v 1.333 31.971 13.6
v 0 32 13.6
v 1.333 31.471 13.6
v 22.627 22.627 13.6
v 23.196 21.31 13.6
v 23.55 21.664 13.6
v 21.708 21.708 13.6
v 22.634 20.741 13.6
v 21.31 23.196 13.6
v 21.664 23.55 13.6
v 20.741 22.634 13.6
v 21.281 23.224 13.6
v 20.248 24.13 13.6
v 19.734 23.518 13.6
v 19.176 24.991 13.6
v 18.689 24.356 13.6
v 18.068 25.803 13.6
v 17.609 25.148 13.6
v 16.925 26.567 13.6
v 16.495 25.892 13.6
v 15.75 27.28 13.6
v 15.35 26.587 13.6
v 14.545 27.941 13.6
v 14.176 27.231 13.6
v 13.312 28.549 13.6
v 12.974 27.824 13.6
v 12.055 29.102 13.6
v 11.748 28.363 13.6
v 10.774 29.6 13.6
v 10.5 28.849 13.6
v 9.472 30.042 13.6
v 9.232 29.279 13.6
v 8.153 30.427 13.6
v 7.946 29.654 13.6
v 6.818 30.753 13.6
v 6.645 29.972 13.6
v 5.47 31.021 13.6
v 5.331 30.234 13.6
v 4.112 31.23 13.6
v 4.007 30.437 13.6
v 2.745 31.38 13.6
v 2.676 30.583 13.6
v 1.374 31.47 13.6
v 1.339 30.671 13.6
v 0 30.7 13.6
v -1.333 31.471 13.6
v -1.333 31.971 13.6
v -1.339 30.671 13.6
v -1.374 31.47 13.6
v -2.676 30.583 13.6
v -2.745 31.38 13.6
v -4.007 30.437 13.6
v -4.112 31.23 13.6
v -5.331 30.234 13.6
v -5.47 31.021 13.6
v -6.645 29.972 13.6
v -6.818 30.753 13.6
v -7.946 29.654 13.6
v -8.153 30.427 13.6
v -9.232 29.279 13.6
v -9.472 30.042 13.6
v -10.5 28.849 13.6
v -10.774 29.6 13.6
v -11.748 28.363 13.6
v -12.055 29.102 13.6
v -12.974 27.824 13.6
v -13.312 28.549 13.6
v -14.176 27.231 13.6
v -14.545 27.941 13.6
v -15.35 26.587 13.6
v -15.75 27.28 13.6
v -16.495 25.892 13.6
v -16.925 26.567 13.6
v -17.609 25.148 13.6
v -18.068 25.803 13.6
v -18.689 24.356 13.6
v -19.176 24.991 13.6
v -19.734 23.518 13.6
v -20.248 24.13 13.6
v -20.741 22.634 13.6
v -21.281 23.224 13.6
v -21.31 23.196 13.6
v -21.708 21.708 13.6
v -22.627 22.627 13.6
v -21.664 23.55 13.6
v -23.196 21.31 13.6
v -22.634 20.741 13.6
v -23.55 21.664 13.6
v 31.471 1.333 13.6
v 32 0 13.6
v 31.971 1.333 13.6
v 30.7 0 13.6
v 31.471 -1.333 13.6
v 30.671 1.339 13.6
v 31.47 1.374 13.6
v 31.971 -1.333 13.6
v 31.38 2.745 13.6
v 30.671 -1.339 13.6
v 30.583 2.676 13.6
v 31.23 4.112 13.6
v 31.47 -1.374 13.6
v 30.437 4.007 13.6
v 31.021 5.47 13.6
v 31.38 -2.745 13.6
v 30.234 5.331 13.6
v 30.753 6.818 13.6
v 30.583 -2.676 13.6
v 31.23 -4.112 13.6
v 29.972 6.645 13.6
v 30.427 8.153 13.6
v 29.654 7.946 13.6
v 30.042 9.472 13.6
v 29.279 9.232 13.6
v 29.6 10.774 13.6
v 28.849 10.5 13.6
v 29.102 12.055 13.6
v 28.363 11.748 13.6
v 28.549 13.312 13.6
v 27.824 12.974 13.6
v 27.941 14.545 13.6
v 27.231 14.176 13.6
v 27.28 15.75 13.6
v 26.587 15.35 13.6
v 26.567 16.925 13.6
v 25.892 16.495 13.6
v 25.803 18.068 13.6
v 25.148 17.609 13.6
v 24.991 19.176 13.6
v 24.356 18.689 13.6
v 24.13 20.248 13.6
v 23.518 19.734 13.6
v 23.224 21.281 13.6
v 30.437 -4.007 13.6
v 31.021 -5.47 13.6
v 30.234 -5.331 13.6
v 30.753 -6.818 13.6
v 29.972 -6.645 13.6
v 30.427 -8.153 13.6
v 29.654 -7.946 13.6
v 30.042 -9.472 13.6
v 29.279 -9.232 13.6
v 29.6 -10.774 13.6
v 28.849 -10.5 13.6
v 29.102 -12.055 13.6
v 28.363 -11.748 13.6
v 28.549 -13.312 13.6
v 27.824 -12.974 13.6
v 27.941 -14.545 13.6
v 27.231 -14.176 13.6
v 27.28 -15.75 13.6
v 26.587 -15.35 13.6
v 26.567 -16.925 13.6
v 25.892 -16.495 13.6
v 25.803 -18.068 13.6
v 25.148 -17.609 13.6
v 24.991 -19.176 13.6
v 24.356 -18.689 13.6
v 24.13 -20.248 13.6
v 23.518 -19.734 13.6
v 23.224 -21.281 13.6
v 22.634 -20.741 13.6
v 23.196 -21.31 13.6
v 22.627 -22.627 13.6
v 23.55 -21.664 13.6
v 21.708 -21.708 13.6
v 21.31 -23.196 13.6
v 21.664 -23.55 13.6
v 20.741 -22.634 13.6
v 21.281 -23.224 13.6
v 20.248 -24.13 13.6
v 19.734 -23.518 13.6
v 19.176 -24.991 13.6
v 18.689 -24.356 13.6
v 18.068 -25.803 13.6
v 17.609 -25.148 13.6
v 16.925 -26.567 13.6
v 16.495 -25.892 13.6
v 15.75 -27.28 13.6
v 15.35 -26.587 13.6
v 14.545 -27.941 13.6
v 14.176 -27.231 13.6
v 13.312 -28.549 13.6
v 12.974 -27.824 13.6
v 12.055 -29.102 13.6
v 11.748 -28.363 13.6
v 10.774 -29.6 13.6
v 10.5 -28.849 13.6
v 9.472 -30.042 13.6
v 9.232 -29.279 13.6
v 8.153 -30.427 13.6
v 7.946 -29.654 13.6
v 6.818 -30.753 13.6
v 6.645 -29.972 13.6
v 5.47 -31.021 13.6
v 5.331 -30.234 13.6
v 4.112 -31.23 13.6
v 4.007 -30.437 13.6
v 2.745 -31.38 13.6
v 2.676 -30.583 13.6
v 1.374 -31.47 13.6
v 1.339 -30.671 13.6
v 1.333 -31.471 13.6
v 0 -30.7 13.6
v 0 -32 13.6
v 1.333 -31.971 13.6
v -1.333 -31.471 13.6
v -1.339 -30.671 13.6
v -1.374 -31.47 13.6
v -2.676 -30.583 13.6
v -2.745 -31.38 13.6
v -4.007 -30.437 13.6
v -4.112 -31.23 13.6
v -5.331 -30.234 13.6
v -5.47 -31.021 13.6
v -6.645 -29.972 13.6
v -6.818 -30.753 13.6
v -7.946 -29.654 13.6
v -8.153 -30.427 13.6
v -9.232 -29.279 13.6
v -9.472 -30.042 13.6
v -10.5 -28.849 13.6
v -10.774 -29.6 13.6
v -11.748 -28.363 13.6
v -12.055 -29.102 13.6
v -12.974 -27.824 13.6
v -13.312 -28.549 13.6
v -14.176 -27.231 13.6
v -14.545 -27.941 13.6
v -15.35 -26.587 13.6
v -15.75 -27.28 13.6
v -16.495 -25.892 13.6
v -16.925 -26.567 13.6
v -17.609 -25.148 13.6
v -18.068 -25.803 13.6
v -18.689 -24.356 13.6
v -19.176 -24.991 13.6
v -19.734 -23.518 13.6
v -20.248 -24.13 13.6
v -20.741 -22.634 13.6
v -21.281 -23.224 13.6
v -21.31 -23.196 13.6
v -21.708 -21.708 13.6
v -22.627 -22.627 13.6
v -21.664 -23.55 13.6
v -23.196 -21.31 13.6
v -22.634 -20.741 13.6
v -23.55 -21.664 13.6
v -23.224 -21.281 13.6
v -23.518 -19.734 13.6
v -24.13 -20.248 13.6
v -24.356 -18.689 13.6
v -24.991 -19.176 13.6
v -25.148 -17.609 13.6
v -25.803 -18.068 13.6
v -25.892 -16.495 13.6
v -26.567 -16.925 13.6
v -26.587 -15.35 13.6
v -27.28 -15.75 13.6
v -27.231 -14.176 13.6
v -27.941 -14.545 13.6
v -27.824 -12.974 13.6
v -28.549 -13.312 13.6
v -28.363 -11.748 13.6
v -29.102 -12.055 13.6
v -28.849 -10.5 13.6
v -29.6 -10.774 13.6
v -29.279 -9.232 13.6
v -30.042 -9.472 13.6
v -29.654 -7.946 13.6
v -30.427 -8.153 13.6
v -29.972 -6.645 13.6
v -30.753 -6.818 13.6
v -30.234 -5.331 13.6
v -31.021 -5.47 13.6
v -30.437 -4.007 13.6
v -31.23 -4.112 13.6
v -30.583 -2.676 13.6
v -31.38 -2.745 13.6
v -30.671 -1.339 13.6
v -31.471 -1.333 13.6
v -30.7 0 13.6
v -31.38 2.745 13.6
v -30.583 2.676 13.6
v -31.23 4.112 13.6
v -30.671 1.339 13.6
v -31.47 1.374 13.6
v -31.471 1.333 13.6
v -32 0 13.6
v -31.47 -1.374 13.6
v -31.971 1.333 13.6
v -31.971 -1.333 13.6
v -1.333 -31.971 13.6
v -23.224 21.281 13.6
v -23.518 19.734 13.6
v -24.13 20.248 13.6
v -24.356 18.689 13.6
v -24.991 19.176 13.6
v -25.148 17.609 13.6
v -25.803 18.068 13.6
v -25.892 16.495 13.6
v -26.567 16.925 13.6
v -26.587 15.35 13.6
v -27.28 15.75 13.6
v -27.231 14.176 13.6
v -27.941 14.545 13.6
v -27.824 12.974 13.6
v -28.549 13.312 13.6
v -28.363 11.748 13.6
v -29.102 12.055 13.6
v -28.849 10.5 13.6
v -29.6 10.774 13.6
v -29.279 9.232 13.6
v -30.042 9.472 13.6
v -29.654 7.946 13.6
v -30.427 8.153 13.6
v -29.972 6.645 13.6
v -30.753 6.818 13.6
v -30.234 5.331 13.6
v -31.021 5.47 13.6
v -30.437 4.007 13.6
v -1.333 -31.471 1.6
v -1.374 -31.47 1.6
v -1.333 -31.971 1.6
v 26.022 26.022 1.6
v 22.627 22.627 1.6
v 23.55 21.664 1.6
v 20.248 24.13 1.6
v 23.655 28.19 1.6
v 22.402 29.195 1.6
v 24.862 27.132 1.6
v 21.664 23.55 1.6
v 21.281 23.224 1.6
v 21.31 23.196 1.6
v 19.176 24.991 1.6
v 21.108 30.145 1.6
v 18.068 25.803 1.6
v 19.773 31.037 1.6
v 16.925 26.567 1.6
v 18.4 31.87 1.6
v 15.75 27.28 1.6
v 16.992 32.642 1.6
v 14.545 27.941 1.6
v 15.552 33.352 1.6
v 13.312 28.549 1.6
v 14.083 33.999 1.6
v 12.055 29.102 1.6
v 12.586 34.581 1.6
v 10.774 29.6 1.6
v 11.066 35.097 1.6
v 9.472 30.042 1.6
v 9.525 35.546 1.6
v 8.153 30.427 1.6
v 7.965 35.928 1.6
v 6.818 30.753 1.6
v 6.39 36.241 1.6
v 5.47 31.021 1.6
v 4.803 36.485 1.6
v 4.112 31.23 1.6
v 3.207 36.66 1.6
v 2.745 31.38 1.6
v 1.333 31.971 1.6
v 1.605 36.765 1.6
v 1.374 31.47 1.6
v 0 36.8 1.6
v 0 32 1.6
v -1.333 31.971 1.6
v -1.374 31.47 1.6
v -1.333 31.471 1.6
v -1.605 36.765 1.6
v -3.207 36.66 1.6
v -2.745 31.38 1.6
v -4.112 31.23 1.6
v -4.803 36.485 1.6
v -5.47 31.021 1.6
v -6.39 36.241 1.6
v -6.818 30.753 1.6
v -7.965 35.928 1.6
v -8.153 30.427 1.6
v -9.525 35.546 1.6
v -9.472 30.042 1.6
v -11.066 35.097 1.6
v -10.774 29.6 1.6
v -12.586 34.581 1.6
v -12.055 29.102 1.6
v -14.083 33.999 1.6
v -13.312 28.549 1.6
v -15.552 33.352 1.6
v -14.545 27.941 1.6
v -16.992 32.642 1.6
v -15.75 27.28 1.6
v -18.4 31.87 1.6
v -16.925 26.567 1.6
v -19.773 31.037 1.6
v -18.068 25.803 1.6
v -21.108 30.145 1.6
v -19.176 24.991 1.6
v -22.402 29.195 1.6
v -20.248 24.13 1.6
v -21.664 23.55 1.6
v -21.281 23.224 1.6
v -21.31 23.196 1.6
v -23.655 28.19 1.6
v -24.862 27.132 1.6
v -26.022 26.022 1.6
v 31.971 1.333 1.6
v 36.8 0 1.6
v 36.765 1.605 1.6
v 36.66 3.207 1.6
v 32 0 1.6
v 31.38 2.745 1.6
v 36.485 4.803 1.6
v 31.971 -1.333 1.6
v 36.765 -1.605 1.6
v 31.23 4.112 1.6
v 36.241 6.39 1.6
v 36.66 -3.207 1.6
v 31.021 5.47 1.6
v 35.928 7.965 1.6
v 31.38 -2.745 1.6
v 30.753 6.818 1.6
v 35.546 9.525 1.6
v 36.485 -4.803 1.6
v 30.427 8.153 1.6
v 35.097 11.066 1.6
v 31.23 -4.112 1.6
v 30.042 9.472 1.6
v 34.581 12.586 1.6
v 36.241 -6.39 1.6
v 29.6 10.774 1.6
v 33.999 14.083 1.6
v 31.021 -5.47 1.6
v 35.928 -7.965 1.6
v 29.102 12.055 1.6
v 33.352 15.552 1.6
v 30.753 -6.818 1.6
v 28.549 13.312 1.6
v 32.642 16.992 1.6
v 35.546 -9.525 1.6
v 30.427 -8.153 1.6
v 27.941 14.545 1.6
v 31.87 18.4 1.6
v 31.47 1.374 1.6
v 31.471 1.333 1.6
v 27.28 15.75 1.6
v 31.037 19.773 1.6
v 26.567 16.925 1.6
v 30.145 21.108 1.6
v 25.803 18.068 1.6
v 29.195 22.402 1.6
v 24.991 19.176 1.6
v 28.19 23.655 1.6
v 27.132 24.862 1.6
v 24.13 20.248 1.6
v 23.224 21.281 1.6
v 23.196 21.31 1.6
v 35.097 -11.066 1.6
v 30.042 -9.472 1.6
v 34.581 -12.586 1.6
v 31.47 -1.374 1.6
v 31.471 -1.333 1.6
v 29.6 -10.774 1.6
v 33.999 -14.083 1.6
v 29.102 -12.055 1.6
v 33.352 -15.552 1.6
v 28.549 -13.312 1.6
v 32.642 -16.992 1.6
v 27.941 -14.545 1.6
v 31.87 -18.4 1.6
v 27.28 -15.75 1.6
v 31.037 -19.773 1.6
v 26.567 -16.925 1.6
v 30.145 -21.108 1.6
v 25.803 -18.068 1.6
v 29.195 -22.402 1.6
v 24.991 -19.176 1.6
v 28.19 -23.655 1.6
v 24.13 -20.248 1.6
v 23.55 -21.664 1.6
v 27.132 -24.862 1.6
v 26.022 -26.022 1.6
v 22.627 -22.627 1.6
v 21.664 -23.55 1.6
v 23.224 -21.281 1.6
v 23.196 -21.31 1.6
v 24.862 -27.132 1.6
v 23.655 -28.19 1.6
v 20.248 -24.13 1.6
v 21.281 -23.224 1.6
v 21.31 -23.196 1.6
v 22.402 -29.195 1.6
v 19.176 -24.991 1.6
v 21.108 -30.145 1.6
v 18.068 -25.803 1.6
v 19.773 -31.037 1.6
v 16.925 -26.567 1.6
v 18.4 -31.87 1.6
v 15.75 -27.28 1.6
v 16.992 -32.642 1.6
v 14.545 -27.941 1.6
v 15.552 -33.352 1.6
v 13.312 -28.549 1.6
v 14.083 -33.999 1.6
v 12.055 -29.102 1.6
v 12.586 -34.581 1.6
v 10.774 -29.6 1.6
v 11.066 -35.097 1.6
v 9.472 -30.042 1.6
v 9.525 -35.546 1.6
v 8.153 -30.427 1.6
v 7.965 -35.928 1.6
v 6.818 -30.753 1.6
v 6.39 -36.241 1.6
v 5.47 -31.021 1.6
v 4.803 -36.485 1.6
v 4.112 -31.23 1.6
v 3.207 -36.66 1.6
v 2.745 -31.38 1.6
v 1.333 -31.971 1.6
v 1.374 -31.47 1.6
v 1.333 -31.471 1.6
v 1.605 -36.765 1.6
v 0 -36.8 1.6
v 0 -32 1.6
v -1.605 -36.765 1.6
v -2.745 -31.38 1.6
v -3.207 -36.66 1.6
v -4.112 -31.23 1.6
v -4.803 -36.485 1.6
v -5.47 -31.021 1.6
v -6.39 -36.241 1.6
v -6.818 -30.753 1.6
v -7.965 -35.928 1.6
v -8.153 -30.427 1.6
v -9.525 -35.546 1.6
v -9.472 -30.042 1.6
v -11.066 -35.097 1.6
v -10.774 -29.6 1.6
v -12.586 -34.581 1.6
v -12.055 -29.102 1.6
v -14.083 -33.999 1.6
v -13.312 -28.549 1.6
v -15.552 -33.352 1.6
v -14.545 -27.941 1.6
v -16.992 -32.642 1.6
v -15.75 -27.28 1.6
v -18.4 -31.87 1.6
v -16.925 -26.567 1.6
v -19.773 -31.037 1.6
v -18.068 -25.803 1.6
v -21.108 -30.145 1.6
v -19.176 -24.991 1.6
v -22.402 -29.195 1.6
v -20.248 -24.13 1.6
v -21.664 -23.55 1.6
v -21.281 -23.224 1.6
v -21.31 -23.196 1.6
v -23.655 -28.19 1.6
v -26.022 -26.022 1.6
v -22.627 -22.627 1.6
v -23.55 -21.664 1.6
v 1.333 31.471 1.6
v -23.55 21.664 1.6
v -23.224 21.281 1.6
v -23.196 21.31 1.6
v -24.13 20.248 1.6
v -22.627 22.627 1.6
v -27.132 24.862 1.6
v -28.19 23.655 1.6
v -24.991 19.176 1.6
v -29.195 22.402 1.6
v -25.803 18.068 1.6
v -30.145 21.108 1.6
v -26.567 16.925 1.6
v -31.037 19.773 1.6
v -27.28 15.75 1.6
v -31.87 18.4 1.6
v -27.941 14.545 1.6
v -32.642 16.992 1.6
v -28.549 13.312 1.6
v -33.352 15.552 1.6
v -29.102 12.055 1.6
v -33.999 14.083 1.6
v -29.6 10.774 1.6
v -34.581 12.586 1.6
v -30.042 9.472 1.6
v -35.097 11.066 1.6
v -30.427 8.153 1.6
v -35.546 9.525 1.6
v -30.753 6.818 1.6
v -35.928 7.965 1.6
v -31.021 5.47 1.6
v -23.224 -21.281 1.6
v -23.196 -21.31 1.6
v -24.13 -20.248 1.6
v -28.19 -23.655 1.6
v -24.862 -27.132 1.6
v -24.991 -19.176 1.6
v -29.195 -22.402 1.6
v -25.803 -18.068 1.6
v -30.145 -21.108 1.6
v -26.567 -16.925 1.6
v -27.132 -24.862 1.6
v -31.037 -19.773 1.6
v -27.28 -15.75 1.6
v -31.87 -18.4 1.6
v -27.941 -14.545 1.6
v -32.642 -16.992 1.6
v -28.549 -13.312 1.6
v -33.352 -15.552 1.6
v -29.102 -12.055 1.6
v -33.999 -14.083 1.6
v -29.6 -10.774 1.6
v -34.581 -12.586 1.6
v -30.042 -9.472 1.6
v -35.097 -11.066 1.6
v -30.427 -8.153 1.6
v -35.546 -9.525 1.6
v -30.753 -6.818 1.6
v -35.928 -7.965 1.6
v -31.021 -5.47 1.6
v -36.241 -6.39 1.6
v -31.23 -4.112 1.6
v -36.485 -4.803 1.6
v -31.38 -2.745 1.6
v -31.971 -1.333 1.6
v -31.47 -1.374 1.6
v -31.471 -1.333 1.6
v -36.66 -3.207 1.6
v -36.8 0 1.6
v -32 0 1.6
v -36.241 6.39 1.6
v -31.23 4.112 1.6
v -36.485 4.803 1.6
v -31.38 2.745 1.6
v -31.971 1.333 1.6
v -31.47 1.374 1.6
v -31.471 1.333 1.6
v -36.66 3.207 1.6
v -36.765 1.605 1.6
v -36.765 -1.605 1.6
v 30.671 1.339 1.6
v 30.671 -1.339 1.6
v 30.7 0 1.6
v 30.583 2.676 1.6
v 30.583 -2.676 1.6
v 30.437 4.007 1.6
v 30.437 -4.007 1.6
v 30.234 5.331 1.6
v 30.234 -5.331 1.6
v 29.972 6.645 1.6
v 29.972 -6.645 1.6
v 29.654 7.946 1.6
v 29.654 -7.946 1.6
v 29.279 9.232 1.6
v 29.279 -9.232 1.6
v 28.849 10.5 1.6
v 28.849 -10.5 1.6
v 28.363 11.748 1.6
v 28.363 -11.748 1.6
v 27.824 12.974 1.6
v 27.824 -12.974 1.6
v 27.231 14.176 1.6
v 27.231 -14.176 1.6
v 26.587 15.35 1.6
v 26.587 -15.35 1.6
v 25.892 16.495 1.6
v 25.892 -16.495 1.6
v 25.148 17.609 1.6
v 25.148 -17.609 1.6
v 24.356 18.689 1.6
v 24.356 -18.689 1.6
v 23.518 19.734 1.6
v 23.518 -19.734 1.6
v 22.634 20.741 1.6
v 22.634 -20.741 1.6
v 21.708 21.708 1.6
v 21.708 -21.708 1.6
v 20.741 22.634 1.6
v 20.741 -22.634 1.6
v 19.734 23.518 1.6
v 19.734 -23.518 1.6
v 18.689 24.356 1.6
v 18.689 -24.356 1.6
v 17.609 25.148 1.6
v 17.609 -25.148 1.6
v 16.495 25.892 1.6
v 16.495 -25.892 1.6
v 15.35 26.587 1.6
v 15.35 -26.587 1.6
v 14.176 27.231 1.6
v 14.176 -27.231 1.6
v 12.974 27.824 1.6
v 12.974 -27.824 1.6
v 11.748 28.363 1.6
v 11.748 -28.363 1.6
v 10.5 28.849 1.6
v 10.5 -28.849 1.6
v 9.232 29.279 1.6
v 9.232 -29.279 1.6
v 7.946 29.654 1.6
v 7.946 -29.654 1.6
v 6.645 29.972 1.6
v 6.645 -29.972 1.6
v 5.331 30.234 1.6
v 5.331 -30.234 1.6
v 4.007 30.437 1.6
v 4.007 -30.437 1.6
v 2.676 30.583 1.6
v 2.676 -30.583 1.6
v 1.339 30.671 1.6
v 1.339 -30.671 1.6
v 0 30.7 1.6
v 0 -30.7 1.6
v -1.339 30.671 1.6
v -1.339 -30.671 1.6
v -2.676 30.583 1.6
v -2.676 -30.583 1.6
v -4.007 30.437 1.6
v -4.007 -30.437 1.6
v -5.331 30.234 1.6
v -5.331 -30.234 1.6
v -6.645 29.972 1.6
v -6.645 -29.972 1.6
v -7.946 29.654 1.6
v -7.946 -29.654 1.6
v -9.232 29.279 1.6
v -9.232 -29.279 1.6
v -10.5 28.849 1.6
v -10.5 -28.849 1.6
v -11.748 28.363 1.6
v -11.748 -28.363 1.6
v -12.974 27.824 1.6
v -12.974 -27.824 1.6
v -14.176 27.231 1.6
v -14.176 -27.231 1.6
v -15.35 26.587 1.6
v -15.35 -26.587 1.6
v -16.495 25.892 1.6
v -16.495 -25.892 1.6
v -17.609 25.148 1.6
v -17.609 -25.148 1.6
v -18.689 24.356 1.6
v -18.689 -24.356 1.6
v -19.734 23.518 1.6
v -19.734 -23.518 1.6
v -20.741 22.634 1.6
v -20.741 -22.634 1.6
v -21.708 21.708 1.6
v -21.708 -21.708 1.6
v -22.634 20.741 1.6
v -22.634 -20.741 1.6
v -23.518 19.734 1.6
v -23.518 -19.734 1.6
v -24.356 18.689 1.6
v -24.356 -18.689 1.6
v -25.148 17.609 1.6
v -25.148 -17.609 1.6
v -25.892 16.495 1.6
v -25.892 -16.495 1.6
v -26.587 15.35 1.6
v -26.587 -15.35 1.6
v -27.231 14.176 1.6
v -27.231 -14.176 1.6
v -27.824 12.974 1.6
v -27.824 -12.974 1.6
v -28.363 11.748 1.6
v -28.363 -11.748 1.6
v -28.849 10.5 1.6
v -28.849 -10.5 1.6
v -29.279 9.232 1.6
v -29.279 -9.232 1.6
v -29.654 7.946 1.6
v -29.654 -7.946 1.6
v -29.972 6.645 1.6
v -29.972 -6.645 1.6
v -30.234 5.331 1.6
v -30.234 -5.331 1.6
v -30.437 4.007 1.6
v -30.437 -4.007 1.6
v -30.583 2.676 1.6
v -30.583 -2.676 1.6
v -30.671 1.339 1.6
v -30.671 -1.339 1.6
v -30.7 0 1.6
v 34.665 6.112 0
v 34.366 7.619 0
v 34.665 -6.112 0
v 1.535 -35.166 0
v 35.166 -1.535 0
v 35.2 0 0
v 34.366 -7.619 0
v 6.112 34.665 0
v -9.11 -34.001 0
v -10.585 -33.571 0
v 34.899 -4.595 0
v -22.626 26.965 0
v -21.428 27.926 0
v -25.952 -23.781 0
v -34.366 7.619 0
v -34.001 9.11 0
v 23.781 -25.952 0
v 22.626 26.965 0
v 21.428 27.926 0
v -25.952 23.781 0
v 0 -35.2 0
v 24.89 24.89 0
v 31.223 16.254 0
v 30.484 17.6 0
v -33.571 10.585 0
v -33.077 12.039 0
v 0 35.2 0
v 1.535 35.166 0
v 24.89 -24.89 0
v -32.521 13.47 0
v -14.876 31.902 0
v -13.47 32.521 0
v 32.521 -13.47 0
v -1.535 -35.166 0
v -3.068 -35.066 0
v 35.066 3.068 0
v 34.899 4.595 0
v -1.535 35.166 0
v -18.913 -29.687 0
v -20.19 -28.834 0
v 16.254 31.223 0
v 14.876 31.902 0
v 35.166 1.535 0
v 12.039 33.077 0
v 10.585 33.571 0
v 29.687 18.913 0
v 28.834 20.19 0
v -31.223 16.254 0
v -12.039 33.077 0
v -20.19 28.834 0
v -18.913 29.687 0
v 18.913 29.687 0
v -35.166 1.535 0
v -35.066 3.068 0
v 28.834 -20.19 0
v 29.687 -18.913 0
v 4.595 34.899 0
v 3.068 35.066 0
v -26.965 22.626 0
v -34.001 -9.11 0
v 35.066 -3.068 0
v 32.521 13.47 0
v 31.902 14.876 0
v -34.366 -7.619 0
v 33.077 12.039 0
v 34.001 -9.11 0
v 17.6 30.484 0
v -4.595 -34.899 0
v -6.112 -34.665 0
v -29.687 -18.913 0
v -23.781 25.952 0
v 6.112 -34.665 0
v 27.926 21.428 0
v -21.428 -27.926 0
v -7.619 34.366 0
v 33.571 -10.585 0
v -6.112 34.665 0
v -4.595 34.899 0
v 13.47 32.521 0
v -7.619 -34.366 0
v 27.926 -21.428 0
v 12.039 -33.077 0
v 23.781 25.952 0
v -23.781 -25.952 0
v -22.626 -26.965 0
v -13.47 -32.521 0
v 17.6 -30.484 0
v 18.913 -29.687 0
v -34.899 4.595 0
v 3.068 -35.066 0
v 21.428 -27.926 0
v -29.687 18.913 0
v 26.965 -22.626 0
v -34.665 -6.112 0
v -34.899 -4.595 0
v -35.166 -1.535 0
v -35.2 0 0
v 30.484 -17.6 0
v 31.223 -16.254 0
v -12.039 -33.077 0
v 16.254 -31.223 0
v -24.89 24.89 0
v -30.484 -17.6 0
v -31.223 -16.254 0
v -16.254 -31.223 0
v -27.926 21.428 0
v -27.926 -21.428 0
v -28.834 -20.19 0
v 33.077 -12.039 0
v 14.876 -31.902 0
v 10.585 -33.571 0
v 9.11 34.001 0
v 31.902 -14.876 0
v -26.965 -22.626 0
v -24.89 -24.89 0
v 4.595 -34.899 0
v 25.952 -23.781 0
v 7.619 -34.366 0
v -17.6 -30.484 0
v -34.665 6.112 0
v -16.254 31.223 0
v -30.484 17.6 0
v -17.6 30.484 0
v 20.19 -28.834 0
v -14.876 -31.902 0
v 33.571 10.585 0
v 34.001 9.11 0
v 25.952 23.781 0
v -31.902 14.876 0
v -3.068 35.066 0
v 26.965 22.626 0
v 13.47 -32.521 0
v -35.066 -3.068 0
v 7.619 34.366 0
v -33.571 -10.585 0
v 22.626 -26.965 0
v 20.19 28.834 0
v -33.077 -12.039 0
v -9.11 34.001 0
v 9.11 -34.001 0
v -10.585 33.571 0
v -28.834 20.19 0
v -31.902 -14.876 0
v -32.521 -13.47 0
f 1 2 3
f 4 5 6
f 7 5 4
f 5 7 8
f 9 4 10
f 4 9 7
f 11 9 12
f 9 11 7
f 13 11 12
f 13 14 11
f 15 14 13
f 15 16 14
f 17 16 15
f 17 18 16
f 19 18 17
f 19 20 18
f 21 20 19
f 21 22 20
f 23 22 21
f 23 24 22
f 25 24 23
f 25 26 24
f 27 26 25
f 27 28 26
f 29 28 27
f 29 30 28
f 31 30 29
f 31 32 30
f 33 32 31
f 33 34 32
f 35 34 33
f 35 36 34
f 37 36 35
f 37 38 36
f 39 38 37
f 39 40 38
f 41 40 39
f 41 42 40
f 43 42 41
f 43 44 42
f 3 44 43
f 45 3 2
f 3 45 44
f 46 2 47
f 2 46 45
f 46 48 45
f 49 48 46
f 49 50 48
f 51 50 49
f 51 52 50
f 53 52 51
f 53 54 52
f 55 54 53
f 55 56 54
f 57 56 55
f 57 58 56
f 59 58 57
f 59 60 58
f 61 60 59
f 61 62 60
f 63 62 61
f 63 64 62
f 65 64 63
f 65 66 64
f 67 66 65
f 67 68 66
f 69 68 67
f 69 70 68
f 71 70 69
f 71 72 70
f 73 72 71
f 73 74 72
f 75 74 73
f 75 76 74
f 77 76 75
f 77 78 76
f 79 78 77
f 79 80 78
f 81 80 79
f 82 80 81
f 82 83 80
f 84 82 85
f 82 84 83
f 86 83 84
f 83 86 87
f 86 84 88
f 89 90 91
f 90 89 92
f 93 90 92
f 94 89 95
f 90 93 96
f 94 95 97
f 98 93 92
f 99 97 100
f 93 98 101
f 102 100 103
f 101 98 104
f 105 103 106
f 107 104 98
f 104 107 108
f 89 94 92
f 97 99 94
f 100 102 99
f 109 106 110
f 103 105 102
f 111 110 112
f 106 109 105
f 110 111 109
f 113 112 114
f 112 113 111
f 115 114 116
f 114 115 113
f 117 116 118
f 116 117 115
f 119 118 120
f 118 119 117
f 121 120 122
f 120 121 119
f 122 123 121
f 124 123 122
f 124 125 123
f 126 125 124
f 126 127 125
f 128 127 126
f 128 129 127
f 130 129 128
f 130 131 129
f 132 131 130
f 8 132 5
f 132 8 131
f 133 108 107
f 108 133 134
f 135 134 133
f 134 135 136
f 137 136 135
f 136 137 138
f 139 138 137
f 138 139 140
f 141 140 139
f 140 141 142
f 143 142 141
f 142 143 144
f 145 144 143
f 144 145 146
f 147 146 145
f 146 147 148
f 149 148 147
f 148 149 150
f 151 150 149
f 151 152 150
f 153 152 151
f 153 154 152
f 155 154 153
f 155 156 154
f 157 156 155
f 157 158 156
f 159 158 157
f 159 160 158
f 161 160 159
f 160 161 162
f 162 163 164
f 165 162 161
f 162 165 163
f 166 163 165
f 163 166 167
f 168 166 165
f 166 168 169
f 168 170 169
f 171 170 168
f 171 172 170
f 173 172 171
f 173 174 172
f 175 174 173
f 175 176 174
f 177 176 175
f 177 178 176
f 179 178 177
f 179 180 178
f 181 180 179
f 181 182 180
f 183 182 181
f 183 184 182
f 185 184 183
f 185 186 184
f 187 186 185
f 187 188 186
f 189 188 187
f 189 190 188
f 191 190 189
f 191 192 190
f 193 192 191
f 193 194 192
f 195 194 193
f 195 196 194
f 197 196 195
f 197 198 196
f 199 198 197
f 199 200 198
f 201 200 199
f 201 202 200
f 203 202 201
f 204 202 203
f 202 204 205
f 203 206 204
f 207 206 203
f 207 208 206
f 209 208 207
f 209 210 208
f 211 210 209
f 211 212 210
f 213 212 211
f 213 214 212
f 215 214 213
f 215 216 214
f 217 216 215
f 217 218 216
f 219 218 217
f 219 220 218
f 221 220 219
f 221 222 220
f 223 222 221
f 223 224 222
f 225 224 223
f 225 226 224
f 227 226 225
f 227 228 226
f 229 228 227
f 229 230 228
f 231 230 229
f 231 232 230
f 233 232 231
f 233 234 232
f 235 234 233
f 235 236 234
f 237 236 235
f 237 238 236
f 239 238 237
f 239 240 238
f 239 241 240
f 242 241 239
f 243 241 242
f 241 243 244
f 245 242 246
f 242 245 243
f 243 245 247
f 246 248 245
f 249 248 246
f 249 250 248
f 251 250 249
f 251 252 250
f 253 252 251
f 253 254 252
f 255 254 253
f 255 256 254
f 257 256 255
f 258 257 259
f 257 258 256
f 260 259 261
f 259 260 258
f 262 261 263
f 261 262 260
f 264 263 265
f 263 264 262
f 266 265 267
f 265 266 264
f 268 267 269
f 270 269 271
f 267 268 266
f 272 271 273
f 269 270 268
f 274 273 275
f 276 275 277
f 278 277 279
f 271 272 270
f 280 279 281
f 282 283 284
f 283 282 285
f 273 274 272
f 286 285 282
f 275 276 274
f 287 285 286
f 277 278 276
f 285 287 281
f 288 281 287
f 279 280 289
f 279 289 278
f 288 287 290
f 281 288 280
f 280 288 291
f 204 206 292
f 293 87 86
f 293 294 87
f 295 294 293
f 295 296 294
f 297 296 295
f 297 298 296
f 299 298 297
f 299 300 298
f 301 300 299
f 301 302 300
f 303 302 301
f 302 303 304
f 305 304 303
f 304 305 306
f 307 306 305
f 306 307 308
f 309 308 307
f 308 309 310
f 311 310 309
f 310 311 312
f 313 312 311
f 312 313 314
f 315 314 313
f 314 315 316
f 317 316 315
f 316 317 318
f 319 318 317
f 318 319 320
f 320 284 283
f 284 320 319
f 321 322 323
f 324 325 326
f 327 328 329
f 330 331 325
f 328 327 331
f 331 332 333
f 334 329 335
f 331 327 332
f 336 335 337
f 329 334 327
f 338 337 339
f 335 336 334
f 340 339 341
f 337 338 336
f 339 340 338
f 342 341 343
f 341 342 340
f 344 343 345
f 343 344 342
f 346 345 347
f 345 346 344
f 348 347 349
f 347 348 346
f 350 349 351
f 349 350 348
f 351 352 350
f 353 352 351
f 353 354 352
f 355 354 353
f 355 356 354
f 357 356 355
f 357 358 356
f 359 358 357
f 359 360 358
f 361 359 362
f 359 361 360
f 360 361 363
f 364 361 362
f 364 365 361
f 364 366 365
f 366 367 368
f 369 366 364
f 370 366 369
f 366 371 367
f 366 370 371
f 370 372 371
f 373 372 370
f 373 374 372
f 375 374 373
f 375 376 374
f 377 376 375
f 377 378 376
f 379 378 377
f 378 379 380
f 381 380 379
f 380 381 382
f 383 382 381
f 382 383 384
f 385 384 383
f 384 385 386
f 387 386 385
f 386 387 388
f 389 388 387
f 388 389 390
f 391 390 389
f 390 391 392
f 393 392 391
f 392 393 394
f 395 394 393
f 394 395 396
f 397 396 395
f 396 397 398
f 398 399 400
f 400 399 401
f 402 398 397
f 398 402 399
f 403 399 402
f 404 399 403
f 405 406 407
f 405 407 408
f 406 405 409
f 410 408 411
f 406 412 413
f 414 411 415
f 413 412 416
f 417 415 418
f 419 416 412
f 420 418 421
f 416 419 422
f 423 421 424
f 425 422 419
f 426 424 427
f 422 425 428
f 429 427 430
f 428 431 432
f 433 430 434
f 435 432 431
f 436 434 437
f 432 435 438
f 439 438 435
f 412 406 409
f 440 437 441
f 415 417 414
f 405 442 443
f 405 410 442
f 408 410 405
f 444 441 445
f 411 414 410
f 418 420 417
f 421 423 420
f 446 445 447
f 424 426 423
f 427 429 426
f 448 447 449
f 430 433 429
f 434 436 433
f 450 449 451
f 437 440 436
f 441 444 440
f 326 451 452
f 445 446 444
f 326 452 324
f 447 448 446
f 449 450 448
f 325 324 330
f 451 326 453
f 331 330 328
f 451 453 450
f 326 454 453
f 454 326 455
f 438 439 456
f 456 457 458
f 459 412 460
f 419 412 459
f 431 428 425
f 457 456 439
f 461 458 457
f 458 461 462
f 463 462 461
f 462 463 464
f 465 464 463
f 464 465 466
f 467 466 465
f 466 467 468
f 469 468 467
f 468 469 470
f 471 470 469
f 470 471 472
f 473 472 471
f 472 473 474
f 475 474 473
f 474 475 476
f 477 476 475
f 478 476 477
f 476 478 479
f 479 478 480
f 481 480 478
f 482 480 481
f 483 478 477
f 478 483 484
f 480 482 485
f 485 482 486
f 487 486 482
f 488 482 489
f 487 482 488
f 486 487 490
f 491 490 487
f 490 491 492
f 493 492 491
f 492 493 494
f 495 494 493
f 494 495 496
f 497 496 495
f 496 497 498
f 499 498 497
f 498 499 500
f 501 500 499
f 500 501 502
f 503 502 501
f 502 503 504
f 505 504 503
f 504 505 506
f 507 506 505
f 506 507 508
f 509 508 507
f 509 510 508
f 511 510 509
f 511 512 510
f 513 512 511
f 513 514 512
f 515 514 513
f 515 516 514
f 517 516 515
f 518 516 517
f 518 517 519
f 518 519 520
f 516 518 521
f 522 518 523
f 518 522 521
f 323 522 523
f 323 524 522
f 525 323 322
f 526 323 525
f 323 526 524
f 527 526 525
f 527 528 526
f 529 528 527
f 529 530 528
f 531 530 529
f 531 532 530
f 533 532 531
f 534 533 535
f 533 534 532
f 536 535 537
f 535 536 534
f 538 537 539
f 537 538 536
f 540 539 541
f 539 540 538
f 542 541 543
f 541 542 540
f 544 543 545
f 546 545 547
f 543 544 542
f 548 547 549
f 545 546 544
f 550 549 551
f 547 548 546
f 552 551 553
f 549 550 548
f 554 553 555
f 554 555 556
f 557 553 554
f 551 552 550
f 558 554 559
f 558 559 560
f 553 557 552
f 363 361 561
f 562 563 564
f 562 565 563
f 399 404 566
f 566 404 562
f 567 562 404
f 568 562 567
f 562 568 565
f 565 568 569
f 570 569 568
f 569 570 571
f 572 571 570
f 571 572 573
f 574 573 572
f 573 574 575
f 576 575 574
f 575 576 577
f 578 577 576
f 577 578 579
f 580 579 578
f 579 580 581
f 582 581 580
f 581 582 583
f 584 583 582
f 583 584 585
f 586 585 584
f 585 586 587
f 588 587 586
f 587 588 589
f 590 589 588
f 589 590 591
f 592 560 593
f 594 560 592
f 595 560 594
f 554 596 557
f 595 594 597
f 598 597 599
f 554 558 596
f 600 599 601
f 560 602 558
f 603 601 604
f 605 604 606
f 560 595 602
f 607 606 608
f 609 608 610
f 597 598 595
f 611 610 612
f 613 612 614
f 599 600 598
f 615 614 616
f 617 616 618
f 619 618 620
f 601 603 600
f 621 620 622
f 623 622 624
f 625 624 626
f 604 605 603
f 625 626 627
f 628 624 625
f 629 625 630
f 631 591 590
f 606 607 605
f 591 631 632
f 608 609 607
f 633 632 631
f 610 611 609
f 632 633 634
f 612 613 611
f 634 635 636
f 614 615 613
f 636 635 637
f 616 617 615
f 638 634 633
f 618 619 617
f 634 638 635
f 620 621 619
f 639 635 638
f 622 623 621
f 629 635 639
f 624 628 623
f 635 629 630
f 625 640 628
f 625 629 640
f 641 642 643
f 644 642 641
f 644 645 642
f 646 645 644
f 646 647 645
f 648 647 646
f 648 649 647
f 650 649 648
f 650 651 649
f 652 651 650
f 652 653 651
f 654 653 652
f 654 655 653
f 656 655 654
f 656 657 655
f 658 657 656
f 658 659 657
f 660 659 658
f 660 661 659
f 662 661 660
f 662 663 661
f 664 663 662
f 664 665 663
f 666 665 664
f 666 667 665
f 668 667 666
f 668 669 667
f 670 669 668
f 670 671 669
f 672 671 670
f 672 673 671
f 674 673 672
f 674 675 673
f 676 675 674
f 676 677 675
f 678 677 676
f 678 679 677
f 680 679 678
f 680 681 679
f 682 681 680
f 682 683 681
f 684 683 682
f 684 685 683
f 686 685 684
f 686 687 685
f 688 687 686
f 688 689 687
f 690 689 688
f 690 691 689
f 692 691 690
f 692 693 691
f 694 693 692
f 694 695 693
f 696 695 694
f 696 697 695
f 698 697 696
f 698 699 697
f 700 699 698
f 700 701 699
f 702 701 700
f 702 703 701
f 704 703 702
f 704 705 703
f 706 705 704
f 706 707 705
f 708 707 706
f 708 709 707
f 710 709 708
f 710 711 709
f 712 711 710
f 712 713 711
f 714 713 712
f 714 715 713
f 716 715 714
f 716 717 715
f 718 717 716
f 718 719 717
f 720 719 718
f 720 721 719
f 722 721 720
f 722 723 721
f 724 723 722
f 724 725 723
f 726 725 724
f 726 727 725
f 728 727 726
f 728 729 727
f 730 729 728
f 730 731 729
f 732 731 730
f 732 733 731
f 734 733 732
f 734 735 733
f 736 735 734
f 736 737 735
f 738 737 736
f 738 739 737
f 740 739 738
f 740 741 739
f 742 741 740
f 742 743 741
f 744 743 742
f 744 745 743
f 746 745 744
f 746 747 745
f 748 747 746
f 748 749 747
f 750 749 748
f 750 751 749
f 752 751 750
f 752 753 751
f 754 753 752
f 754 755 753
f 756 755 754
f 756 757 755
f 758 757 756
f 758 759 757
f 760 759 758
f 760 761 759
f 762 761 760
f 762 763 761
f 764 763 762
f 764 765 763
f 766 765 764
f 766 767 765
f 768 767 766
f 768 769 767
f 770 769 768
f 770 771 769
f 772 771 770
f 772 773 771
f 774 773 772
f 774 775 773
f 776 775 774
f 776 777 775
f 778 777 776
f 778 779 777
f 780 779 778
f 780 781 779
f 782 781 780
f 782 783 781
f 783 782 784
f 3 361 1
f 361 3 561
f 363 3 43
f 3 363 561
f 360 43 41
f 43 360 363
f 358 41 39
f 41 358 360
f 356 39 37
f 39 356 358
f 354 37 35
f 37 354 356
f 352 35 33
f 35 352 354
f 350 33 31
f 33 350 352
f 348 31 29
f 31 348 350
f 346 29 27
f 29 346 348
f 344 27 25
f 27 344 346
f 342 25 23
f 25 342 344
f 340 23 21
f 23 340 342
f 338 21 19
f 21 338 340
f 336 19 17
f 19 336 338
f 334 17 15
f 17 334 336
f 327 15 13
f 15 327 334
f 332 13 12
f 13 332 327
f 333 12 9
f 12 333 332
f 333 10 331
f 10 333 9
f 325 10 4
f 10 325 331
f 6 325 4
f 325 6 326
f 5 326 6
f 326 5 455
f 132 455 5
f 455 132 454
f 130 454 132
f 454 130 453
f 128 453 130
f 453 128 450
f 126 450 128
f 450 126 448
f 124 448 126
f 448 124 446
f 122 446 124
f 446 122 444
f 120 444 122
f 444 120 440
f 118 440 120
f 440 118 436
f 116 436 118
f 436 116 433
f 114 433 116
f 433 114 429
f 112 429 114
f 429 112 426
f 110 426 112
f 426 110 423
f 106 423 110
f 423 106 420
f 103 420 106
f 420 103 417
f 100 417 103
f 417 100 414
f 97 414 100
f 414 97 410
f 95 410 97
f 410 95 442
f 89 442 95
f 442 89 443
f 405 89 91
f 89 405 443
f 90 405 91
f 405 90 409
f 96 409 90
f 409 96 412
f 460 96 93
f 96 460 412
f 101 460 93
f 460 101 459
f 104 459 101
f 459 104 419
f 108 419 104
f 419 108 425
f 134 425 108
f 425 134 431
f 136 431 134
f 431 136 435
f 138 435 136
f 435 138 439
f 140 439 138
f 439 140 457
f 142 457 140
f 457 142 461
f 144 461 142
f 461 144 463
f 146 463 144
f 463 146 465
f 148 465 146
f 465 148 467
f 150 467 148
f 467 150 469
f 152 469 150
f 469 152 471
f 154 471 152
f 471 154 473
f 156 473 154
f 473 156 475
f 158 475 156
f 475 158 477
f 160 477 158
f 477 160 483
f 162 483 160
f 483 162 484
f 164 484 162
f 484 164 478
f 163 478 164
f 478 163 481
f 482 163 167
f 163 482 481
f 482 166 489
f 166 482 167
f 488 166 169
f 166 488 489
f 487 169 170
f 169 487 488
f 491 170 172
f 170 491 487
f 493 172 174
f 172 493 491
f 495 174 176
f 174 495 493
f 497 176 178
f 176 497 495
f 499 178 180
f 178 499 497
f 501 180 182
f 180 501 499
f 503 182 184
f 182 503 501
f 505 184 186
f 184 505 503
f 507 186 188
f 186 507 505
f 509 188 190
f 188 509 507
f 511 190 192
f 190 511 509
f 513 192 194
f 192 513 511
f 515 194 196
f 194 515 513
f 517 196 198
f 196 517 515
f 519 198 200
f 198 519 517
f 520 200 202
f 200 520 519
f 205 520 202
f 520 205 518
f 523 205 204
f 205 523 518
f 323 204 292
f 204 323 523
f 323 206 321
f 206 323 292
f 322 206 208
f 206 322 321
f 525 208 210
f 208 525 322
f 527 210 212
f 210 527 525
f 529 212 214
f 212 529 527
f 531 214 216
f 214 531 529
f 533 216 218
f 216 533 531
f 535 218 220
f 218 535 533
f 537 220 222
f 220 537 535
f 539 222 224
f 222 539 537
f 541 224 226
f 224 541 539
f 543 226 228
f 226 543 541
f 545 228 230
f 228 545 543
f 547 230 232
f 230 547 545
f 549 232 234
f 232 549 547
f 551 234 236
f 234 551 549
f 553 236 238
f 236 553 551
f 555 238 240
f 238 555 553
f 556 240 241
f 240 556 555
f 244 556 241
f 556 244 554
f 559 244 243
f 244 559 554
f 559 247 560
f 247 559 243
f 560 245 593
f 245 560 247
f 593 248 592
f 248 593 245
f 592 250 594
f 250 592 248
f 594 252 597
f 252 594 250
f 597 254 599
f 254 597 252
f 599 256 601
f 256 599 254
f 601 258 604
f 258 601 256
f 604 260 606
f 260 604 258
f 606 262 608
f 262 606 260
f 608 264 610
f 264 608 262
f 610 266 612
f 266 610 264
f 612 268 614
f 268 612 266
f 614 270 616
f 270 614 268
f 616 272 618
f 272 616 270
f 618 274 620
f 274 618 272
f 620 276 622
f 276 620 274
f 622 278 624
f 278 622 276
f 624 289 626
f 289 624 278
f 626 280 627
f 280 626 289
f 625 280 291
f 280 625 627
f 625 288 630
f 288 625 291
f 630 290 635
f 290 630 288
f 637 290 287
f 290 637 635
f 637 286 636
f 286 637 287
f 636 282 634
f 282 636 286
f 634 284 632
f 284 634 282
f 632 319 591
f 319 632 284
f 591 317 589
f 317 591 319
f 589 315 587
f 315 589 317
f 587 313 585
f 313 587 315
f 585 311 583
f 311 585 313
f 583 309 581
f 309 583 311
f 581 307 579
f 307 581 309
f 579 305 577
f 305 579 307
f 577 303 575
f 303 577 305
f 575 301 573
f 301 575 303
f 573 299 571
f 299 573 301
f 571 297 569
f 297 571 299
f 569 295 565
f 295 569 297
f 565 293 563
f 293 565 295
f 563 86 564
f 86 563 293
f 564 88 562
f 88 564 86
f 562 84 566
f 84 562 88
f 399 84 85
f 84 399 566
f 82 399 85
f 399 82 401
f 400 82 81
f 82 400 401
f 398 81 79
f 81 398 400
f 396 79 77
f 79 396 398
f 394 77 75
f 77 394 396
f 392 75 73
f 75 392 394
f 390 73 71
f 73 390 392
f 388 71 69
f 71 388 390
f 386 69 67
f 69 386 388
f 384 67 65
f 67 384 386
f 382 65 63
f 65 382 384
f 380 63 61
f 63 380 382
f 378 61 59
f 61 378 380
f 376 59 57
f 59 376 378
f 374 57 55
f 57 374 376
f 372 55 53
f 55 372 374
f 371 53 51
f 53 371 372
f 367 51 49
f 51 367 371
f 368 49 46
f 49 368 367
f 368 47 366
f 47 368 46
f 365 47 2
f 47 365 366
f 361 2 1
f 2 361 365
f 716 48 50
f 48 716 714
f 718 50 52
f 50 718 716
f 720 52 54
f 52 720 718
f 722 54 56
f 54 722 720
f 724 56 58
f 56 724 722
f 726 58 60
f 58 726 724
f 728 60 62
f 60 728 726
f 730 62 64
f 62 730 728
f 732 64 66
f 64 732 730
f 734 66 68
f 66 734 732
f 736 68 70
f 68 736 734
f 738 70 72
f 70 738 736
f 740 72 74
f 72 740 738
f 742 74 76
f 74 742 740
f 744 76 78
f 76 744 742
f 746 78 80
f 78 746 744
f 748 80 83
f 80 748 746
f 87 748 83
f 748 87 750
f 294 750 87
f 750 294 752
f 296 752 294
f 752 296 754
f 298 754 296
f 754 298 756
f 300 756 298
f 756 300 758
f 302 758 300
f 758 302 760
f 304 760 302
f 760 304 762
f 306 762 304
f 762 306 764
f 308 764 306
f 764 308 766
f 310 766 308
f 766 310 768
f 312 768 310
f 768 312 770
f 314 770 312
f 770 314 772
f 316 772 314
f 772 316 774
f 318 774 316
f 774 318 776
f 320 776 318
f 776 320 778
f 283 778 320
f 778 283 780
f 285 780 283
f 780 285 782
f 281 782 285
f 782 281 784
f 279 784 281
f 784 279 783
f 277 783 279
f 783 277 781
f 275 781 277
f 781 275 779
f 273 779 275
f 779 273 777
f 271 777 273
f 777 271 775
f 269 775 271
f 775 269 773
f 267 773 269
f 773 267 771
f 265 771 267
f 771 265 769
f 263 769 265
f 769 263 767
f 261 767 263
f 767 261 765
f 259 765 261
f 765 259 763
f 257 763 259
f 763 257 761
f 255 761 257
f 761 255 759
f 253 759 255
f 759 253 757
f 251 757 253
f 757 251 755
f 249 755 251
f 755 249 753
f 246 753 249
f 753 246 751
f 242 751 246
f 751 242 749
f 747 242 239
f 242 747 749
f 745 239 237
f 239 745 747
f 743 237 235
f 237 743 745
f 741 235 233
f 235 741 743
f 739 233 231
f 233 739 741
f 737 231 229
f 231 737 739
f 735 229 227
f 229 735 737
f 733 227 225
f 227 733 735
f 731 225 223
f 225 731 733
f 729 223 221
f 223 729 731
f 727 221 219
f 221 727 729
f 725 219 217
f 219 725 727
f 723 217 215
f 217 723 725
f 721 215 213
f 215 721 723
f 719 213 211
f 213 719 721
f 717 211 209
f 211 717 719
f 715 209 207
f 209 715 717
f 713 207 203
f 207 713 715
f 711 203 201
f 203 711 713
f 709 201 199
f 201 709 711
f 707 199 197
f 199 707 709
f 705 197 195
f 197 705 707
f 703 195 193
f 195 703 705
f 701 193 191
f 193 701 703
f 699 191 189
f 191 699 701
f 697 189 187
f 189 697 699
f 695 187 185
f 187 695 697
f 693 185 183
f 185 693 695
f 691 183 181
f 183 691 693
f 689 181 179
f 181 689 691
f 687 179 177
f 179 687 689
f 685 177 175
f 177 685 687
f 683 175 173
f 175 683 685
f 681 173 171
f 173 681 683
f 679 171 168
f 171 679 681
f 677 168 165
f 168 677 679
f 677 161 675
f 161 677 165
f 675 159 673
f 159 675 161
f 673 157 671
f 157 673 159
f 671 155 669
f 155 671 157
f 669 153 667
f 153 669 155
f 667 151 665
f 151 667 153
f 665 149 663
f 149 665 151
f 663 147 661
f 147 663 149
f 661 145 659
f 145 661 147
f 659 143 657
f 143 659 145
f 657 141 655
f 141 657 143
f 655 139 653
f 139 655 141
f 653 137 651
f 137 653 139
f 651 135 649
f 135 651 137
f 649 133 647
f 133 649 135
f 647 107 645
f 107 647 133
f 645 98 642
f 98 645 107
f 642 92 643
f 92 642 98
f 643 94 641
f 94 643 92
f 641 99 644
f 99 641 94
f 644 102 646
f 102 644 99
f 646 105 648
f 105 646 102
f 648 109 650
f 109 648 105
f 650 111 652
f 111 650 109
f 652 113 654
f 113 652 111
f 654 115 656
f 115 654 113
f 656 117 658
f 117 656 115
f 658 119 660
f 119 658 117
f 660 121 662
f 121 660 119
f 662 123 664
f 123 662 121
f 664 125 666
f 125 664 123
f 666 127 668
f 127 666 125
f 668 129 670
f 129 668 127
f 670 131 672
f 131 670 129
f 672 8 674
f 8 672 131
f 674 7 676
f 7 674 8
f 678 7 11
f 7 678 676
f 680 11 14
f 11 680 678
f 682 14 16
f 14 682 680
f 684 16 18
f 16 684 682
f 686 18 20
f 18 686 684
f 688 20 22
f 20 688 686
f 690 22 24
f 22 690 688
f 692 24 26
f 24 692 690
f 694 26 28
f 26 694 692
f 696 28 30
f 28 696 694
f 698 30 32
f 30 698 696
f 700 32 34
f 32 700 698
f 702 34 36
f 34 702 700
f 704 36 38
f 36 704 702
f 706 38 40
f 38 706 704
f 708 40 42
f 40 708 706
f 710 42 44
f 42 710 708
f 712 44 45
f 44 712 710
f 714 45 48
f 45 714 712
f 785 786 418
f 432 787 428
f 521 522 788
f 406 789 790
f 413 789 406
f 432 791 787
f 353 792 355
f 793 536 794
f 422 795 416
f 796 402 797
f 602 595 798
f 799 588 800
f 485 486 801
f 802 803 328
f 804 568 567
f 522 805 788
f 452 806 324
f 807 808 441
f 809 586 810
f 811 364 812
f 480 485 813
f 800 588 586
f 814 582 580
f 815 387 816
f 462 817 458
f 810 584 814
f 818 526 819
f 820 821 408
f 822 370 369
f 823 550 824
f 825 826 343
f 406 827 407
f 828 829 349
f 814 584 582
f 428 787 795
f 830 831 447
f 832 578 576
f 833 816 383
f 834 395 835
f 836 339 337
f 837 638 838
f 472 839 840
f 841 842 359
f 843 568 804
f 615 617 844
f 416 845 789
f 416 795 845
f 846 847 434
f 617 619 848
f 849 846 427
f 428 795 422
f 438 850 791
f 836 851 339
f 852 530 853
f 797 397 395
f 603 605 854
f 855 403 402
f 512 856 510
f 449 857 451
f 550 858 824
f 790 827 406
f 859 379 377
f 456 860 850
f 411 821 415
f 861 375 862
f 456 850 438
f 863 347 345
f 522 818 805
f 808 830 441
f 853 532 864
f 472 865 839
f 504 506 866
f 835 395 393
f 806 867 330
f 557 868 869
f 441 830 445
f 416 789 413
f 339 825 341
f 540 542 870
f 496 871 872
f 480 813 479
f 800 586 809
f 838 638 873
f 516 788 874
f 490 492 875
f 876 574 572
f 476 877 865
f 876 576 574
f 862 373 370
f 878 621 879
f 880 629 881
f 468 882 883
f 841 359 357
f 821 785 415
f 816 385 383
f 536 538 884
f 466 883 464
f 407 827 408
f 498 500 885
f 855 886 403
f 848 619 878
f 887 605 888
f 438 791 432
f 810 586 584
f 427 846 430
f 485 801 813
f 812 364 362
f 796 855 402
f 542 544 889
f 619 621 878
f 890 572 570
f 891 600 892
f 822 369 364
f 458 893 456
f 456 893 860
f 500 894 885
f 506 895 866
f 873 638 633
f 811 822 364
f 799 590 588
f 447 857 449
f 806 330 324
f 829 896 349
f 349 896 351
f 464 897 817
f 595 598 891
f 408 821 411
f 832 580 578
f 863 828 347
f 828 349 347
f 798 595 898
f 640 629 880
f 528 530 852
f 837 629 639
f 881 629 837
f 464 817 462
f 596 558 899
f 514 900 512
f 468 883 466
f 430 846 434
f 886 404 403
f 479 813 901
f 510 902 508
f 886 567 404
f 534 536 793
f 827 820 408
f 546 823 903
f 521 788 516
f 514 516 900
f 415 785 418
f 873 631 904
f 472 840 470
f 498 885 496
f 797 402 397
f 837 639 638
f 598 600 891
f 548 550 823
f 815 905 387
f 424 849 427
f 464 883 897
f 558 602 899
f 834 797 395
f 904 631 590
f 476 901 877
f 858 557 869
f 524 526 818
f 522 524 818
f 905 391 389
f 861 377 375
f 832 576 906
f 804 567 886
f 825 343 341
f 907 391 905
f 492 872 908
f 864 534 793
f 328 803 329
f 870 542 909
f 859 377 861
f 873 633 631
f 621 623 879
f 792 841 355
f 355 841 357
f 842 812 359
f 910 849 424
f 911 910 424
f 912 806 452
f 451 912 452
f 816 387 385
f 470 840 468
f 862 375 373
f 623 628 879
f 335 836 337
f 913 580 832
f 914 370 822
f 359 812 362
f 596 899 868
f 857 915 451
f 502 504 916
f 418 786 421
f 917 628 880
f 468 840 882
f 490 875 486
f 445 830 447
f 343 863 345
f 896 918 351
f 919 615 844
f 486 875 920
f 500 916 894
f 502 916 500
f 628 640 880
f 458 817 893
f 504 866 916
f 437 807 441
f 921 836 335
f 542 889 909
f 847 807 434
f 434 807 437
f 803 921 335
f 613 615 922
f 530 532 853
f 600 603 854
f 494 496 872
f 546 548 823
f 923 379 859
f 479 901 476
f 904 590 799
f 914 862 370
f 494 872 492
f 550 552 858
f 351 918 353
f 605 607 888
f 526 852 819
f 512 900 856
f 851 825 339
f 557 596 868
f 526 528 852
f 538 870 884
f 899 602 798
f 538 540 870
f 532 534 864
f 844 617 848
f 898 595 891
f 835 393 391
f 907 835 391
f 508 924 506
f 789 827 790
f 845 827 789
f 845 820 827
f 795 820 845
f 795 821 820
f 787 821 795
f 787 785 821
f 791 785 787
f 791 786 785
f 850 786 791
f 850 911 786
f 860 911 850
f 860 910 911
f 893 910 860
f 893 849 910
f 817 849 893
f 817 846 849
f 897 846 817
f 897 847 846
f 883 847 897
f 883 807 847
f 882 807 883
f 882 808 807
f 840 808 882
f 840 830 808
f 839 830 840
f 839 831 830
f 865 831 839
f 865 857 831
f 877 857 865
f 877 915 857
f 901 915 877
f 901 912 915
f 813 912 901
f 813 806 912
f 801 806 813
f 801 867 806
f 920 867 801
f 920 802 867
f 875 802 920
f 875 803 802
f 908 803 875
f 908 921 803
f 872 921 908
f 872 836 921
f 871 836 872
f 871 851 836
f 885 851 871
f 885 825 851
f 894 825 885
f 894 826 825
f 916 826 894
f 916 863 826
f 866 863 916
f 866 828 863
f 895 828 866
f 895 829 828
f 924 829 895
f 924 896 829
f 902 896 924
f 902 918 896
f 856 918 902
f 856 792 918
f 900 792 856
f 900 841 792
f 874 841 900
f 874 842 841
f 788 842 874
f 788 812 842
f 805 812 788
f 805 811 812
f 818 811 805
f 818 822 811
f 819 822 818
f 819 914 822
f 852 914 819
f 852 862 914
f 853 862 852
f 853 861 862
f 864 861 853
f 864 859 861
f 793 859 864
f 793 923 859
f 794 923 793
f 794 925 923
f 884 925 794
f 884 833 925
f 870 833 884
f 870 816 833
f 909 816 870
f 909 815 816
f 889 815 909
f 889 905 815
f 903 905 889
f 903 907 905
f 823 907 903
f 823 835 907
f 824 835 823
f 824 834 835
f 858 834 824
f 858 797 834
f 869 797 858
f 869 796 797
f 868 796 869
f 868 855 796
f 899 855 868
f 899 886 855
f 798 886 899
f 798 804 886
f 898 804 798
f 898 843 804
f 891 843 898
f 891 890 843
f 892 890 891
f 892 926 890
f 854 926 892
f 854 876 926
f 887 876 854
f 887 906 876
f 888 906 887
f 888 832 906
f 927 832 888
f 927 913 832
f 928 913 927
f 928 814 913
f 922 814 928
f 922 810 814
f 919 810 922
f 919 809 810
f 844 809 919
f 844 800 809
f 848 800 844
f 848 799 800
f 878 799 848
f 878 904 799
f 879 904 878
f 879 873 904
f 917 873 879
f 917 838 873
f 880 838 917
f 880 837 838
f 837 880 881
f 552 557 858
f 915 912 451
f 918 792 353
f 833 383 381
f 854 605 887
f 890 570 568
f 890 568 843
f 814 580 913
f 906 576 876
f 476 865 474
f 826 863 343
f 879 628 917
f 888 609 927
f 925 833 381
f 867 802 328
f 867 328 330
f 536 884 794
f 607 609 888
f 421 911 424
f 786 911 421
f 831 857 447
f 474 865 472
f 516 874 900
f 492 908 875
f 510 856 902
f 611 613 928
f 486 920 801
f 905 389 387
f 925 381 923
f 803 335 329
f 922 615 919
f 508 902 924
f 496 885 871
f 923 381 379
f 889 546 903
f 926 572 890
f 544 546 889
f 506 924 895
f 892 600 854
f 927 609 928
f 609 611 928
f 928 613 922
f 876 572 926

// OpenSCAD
//External Diameter (equal to the diameter of the hole where you'll insert this cap)
Diameter=64; // [1:100]

//Teeth protruding
TeethExt=1; // [0.1:0.1:10]

//How much teeth?
TeethExtCount=8; // [0:36]

//Thickness of the cylinder's perimeter that will be in the hole
Thickness=1.6; // [0.1:0.1:10]

//Height of the part that will be inserted in the hole
Height=12; // [0.1:0.1:100]
h=1.6;
/* [Hidden] */
//Segments number in circles
Segments=144;

translate([0,0,Height+h])
rotate([180,0,0])
union(){
    linear_extrude(height=Height, convexity=10)
    difference(){
        intersection(){
            union(){
                circle($fn=Segments,d=Diameter-TeethExt);
                for(r=[0:360/TeethExtCount:360])
                    rotate(a=r, v=[0,0,1])
                        square(size=[Diameter/24, Diameter*1.5], center=true);
                
            }
            circle($fn=Segments,d=Diameter);
        }
        circle($fn=Segments,d=Diameter-Thickness-TeethExt);
    }
    translate([0,0,Height])
        cylinder($fn=Segments,h=h, d1=Diameter*1.1+h*2, d2=Diameter*1.1);
}
